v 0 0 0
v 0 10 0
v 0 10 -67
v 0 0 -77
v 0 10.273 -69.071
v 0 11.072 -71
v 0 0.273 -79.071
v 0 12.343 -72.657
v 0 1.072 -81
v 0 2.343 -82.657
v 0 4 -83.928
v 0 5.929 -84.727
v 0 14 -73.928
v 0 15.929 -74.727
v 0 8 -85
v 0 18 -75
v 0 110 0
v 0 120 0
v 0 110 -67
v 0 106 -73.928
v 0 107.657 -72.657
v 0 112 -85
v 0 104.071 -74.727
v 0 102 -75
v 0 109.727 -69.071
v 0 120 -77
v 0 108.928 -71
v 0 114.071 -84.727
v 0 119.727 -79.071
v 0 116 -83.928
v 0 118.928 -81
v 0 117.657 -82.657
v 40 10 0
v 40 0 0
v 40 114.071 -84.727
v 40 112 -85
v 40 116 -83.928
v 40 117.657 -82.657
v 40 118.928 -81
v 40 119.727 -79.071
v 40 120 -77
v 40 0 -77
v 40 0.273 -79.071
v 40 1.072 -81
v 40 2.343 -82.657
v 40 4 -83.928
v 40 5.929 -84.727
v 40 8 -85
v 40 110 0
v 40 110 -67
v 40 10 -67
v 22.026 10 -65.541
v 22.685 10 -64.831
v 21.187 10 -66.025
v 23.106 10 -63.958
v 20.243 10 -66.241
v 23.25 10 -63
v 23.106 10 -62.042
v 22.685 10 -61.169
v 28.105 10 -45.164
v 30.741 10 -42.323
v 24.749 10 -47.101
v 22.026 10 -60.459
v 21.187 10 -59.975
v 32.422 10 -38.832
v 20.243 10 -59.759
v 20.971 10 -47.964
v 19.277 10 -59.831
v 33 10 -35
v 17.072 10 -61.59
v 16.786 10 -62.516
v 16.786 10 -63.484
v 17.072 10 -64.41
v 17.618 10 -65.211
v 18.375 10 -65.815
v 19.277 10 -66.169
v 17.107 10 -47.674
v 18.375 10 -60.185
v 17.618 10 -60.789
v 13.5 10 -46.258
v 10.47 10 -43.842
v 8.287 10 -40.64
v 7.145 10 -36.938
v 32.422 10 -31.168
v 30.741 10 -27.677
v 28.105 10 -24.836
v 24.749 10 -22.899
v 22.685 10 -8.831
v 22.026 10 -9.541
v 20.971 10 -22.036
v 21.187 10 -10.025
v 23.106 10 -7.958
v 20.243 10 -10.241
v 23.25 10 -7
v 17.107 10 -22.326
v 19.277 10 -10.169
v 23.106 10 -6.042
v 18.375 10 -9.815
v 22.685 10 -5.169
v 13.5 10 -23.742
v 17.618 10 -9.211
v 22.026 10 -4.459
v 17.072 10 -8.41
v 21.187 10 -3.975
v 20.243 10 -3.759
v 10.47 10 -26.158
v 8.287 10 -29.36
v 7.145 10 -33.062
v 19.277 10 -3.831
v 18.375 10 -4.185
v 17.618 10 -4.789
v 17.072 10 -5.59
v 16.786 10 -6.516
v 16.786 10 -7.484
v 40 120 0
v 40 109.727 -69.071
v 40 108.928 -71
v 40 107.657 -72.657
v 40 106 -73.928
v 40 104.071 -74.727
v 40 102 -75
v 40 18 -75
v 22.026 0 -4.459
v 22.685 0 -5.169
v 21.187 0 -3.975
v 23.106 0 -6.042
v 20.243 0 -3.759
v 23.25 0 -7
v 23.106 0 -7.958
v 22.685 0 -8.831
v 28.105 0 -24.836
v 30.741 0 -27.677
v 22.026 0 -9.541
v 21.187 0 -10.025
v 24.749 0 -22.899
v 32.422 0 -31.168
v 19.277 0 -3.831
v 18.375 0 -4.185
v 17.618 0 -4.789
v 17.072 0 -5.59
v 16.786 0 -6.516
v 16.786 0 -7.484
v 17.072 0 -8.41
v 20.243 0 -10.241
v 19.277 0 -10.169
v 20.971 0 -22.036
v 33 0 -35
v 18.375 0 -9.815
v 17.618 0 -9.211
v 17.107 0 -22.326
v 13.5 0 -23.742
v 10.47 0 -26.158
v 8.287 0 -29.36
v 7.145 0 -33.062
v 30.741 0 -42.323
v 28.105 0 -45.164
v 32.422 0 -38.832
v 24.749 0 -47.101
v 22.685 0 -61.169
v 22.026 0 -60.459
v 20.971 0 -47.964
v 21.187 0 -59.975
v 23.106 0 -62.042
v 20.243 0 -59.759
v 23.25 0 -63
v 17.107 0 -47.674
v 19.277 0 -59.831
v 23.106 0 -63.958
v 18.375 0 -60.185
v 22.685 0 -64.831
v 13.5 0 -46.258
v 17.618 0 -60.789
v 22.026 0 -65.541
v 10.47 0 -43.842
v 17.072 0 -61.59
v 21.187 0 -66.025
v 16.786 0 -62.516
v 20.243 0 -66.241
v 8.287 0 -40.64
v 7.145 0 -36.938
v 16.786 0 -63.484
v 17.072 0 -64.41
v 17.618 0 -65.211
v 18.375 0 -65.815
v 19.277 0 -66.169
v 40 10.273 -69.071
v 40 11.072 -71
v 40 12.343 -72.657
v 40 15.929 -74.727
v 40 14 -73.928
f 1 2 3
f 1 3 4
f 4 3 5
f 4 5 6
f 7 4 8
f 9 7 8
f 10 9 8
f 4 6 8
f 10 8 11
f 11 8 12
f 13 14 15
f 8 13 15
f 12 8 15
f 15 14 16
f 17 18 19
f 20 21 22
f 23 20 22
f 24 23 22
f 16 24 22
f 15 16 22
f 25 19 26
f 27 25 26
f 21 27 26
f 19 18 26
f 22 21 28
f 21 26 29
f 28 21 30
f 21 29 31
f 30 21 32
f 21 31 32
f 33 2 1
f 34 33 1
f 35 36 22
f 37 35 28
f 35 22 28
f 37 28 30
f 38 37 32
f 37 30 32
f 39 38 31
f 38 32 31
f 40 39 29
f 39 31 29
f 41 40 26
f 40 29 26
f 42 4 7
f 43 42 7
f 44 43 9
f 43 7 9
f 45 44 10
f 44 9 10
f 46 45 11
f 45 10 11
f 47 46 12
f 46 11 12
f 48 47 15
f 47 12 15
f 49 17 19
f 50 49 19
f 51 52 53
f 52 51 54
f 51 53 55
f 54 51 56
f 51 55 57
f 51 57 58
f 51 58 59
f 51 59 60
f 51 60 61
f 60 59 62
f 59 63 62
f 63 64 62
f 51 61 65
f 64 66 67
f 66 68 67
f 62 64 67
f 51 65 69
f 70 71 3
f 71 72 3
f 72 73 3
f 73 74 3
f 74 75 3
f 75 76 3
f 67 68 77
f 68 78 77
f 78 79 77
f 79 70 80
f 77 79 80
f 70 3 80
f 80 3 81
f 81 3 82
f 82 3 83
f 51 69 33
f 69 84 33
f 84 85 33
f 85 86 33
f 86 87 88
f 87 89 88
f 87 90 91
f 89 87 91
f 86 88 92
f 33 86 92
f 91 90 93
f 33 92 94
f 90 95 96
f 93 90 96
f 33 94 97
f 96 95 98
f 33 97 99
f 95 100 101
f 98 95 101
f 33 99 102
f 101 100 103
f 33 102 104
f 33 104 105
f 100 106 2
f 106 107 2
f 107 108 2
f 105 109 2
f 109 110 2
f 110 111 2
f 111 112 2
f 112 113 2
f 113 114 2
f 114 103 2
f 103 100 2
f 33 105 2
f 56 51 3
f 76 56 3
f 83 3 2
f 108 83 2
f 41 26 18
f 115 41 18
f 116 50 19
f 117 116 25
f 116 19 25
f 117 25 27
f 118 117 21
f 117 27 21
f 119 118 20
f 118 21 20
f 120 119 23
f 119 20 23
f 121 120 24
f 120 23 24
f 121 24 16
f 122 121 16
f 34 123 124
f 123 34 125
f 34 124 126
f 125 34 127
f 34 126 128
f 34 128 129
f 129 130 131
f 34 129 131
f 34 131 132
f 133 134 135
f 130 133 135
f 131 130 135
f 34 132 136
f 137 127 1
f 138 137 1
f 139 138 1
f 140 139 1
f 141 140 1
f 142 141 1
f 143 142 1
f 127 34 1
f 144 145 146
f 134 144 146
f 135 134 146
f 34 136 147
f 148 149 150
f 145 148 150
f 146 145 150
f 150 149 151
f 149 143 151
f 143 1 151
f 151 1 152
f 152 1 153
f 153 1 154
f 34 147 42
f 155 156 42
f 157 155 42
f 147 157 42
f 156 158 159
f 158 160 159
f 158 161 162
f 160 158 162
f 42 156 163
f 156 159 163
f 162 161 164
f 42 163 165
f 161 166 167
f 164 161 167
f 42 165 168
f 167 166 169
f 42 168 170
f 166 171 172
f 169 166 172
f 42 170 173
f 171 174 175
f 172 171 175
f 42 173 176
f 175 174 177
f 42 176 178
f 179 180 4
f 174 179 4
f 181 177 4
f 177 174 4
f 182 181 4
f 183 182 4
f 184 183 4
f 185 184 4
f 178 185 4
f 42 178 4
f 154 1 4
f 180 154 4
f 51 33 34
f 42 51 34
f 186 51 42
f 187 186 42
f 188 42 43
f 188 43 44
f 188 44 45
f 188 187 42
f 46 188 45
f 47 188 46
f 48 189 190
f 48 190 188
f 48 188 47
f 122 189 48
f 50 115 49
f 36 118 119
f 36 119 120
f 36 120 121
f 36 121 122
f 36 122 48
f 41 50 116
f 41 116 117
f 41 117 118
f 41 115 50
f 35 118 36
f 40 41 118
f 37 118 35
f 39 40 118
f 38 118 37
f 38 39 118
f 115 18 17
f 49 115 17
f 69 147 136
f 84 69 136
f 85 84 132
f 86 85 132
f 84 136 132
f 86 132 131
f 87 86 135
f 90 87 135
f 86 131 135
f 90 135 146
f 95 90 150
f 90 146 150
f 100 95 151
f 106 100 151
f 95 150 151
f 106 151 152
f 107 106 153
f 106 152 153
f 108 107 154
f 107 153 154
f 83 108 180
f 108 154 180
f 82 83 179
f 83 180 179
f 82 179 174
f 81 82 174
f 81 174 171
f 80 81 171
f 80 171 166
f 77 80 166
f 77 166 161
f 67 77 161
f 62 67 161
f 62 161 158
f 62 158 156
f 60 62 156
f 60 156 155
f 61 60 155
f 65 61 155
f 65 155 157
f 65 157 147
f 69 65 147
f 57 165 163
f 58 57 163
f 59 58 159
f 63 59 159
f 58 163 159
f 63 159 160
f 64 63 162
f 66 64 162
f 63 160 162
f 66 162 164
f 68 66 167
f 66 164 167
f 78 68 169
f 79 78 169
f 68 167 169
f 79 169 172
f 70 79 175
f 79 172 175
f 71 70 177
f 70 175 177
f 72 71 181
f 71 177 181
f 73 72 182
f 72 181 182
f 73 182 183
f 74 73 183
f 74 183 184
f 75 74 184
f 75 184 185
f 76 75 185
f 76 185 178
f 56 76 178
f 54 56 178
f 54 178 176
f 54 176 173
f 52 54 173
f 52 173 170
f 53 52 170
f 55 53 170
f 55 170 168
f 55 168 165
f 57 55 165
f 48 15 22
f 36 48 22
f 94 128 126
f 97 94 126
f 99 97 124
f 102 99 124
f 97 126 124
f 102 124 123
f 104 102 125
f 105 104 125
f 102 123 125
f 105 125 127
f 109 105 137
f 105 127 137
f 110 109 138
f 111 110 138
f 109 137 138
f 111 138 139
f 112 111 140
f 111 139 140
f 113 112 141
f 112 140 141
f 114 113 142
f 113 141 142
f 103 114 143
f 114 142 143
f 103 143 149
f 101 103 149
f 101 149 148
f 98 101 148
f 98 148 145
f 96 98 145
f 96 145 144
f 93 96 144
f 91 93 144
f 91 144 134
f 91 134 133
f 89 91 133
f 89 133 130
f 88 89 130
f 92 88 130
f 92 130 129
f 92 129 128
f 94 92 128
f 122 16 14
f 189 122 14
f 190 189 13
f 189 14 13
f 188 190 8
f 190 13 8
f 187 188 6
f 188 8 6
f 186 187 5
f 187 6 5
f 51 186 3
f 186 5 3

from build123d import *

# Parameters (mm, degrees)
EXTRUDE_1_DEPTH     = 40
CUT_EXTRUDE_1_REACH = 122
SKETCH_5_R          = 13
SKETCH_6_R          = 3.25
CUT_EXTRUDE_2_DEPTH = 20


with BuildPart() as part:
    # 草图1 → 凸台-拉伸1 (new body)
    with BuildSketch(Plane(origin=(0, 0, 0), x_dir=(0, 0, -1), z_dir=(1, 0, 0))):
        with BuildLine():
            Line((0, 0), (77, 0))
            ThreePointArc((77, 0), (82.656854249, 2.343145751), (85, 8))
            Line((85, 8), (85, 112))
            ThreePointArc((85, 112), (82.656854249, 117.656854249), (77, 120))
            Line((77, 120), (0, 120))
            Line((0, 120), (0, 110))
            Line((0, 110), (67, 110))
            ThreePointArc((67, 110), (72.656854249, 107.656854249), (75, 102))
            Line((75, 102), (75, 18))
            ThreePointArc((75, 18), (72.656854249, 12.343145751), (67, 10))
            Line((67, 10), (0, 10))
            Line((0, 10), (0, 0))
        make_face()
    extrude(amount=EXTRUDE_1_DEPTH)

    # 草图5 → 切除-拉伸1 (cut, up to next)
    with BuildSketch(Plane.XZ, mode=Mode.PRIVATE) as cut_extrude_1_sk1:
        with Locations((20, -35)):
            Circle(SKETCH_5_R)
    cut_extrude_1_tool1 = extrude(cut_extrude_1_sk1.sketch, amount=-CUT_EXTRUDE_1_REACH, mode=Mode.PRIVATE) & part.part
    add(cut_extrude_1_tool1.solids().sort_by_distance((20, 0, -35))[0], mode=Mode.SUBTRACT)

    # 草图6 → 切除-拉伸2 (cut)
    with BuildSketch(Plane.XZ):
        with Locations((20, -7)):
            Circle(SKETCH_6_R)
        with Locations((20, -63)):
            Circle(SKETCH_6_R)
    extrude(amount=-CUT_EXTRUDE_2_DEPTH, mode=Mode.SUBTRACT)


solid = part.part
